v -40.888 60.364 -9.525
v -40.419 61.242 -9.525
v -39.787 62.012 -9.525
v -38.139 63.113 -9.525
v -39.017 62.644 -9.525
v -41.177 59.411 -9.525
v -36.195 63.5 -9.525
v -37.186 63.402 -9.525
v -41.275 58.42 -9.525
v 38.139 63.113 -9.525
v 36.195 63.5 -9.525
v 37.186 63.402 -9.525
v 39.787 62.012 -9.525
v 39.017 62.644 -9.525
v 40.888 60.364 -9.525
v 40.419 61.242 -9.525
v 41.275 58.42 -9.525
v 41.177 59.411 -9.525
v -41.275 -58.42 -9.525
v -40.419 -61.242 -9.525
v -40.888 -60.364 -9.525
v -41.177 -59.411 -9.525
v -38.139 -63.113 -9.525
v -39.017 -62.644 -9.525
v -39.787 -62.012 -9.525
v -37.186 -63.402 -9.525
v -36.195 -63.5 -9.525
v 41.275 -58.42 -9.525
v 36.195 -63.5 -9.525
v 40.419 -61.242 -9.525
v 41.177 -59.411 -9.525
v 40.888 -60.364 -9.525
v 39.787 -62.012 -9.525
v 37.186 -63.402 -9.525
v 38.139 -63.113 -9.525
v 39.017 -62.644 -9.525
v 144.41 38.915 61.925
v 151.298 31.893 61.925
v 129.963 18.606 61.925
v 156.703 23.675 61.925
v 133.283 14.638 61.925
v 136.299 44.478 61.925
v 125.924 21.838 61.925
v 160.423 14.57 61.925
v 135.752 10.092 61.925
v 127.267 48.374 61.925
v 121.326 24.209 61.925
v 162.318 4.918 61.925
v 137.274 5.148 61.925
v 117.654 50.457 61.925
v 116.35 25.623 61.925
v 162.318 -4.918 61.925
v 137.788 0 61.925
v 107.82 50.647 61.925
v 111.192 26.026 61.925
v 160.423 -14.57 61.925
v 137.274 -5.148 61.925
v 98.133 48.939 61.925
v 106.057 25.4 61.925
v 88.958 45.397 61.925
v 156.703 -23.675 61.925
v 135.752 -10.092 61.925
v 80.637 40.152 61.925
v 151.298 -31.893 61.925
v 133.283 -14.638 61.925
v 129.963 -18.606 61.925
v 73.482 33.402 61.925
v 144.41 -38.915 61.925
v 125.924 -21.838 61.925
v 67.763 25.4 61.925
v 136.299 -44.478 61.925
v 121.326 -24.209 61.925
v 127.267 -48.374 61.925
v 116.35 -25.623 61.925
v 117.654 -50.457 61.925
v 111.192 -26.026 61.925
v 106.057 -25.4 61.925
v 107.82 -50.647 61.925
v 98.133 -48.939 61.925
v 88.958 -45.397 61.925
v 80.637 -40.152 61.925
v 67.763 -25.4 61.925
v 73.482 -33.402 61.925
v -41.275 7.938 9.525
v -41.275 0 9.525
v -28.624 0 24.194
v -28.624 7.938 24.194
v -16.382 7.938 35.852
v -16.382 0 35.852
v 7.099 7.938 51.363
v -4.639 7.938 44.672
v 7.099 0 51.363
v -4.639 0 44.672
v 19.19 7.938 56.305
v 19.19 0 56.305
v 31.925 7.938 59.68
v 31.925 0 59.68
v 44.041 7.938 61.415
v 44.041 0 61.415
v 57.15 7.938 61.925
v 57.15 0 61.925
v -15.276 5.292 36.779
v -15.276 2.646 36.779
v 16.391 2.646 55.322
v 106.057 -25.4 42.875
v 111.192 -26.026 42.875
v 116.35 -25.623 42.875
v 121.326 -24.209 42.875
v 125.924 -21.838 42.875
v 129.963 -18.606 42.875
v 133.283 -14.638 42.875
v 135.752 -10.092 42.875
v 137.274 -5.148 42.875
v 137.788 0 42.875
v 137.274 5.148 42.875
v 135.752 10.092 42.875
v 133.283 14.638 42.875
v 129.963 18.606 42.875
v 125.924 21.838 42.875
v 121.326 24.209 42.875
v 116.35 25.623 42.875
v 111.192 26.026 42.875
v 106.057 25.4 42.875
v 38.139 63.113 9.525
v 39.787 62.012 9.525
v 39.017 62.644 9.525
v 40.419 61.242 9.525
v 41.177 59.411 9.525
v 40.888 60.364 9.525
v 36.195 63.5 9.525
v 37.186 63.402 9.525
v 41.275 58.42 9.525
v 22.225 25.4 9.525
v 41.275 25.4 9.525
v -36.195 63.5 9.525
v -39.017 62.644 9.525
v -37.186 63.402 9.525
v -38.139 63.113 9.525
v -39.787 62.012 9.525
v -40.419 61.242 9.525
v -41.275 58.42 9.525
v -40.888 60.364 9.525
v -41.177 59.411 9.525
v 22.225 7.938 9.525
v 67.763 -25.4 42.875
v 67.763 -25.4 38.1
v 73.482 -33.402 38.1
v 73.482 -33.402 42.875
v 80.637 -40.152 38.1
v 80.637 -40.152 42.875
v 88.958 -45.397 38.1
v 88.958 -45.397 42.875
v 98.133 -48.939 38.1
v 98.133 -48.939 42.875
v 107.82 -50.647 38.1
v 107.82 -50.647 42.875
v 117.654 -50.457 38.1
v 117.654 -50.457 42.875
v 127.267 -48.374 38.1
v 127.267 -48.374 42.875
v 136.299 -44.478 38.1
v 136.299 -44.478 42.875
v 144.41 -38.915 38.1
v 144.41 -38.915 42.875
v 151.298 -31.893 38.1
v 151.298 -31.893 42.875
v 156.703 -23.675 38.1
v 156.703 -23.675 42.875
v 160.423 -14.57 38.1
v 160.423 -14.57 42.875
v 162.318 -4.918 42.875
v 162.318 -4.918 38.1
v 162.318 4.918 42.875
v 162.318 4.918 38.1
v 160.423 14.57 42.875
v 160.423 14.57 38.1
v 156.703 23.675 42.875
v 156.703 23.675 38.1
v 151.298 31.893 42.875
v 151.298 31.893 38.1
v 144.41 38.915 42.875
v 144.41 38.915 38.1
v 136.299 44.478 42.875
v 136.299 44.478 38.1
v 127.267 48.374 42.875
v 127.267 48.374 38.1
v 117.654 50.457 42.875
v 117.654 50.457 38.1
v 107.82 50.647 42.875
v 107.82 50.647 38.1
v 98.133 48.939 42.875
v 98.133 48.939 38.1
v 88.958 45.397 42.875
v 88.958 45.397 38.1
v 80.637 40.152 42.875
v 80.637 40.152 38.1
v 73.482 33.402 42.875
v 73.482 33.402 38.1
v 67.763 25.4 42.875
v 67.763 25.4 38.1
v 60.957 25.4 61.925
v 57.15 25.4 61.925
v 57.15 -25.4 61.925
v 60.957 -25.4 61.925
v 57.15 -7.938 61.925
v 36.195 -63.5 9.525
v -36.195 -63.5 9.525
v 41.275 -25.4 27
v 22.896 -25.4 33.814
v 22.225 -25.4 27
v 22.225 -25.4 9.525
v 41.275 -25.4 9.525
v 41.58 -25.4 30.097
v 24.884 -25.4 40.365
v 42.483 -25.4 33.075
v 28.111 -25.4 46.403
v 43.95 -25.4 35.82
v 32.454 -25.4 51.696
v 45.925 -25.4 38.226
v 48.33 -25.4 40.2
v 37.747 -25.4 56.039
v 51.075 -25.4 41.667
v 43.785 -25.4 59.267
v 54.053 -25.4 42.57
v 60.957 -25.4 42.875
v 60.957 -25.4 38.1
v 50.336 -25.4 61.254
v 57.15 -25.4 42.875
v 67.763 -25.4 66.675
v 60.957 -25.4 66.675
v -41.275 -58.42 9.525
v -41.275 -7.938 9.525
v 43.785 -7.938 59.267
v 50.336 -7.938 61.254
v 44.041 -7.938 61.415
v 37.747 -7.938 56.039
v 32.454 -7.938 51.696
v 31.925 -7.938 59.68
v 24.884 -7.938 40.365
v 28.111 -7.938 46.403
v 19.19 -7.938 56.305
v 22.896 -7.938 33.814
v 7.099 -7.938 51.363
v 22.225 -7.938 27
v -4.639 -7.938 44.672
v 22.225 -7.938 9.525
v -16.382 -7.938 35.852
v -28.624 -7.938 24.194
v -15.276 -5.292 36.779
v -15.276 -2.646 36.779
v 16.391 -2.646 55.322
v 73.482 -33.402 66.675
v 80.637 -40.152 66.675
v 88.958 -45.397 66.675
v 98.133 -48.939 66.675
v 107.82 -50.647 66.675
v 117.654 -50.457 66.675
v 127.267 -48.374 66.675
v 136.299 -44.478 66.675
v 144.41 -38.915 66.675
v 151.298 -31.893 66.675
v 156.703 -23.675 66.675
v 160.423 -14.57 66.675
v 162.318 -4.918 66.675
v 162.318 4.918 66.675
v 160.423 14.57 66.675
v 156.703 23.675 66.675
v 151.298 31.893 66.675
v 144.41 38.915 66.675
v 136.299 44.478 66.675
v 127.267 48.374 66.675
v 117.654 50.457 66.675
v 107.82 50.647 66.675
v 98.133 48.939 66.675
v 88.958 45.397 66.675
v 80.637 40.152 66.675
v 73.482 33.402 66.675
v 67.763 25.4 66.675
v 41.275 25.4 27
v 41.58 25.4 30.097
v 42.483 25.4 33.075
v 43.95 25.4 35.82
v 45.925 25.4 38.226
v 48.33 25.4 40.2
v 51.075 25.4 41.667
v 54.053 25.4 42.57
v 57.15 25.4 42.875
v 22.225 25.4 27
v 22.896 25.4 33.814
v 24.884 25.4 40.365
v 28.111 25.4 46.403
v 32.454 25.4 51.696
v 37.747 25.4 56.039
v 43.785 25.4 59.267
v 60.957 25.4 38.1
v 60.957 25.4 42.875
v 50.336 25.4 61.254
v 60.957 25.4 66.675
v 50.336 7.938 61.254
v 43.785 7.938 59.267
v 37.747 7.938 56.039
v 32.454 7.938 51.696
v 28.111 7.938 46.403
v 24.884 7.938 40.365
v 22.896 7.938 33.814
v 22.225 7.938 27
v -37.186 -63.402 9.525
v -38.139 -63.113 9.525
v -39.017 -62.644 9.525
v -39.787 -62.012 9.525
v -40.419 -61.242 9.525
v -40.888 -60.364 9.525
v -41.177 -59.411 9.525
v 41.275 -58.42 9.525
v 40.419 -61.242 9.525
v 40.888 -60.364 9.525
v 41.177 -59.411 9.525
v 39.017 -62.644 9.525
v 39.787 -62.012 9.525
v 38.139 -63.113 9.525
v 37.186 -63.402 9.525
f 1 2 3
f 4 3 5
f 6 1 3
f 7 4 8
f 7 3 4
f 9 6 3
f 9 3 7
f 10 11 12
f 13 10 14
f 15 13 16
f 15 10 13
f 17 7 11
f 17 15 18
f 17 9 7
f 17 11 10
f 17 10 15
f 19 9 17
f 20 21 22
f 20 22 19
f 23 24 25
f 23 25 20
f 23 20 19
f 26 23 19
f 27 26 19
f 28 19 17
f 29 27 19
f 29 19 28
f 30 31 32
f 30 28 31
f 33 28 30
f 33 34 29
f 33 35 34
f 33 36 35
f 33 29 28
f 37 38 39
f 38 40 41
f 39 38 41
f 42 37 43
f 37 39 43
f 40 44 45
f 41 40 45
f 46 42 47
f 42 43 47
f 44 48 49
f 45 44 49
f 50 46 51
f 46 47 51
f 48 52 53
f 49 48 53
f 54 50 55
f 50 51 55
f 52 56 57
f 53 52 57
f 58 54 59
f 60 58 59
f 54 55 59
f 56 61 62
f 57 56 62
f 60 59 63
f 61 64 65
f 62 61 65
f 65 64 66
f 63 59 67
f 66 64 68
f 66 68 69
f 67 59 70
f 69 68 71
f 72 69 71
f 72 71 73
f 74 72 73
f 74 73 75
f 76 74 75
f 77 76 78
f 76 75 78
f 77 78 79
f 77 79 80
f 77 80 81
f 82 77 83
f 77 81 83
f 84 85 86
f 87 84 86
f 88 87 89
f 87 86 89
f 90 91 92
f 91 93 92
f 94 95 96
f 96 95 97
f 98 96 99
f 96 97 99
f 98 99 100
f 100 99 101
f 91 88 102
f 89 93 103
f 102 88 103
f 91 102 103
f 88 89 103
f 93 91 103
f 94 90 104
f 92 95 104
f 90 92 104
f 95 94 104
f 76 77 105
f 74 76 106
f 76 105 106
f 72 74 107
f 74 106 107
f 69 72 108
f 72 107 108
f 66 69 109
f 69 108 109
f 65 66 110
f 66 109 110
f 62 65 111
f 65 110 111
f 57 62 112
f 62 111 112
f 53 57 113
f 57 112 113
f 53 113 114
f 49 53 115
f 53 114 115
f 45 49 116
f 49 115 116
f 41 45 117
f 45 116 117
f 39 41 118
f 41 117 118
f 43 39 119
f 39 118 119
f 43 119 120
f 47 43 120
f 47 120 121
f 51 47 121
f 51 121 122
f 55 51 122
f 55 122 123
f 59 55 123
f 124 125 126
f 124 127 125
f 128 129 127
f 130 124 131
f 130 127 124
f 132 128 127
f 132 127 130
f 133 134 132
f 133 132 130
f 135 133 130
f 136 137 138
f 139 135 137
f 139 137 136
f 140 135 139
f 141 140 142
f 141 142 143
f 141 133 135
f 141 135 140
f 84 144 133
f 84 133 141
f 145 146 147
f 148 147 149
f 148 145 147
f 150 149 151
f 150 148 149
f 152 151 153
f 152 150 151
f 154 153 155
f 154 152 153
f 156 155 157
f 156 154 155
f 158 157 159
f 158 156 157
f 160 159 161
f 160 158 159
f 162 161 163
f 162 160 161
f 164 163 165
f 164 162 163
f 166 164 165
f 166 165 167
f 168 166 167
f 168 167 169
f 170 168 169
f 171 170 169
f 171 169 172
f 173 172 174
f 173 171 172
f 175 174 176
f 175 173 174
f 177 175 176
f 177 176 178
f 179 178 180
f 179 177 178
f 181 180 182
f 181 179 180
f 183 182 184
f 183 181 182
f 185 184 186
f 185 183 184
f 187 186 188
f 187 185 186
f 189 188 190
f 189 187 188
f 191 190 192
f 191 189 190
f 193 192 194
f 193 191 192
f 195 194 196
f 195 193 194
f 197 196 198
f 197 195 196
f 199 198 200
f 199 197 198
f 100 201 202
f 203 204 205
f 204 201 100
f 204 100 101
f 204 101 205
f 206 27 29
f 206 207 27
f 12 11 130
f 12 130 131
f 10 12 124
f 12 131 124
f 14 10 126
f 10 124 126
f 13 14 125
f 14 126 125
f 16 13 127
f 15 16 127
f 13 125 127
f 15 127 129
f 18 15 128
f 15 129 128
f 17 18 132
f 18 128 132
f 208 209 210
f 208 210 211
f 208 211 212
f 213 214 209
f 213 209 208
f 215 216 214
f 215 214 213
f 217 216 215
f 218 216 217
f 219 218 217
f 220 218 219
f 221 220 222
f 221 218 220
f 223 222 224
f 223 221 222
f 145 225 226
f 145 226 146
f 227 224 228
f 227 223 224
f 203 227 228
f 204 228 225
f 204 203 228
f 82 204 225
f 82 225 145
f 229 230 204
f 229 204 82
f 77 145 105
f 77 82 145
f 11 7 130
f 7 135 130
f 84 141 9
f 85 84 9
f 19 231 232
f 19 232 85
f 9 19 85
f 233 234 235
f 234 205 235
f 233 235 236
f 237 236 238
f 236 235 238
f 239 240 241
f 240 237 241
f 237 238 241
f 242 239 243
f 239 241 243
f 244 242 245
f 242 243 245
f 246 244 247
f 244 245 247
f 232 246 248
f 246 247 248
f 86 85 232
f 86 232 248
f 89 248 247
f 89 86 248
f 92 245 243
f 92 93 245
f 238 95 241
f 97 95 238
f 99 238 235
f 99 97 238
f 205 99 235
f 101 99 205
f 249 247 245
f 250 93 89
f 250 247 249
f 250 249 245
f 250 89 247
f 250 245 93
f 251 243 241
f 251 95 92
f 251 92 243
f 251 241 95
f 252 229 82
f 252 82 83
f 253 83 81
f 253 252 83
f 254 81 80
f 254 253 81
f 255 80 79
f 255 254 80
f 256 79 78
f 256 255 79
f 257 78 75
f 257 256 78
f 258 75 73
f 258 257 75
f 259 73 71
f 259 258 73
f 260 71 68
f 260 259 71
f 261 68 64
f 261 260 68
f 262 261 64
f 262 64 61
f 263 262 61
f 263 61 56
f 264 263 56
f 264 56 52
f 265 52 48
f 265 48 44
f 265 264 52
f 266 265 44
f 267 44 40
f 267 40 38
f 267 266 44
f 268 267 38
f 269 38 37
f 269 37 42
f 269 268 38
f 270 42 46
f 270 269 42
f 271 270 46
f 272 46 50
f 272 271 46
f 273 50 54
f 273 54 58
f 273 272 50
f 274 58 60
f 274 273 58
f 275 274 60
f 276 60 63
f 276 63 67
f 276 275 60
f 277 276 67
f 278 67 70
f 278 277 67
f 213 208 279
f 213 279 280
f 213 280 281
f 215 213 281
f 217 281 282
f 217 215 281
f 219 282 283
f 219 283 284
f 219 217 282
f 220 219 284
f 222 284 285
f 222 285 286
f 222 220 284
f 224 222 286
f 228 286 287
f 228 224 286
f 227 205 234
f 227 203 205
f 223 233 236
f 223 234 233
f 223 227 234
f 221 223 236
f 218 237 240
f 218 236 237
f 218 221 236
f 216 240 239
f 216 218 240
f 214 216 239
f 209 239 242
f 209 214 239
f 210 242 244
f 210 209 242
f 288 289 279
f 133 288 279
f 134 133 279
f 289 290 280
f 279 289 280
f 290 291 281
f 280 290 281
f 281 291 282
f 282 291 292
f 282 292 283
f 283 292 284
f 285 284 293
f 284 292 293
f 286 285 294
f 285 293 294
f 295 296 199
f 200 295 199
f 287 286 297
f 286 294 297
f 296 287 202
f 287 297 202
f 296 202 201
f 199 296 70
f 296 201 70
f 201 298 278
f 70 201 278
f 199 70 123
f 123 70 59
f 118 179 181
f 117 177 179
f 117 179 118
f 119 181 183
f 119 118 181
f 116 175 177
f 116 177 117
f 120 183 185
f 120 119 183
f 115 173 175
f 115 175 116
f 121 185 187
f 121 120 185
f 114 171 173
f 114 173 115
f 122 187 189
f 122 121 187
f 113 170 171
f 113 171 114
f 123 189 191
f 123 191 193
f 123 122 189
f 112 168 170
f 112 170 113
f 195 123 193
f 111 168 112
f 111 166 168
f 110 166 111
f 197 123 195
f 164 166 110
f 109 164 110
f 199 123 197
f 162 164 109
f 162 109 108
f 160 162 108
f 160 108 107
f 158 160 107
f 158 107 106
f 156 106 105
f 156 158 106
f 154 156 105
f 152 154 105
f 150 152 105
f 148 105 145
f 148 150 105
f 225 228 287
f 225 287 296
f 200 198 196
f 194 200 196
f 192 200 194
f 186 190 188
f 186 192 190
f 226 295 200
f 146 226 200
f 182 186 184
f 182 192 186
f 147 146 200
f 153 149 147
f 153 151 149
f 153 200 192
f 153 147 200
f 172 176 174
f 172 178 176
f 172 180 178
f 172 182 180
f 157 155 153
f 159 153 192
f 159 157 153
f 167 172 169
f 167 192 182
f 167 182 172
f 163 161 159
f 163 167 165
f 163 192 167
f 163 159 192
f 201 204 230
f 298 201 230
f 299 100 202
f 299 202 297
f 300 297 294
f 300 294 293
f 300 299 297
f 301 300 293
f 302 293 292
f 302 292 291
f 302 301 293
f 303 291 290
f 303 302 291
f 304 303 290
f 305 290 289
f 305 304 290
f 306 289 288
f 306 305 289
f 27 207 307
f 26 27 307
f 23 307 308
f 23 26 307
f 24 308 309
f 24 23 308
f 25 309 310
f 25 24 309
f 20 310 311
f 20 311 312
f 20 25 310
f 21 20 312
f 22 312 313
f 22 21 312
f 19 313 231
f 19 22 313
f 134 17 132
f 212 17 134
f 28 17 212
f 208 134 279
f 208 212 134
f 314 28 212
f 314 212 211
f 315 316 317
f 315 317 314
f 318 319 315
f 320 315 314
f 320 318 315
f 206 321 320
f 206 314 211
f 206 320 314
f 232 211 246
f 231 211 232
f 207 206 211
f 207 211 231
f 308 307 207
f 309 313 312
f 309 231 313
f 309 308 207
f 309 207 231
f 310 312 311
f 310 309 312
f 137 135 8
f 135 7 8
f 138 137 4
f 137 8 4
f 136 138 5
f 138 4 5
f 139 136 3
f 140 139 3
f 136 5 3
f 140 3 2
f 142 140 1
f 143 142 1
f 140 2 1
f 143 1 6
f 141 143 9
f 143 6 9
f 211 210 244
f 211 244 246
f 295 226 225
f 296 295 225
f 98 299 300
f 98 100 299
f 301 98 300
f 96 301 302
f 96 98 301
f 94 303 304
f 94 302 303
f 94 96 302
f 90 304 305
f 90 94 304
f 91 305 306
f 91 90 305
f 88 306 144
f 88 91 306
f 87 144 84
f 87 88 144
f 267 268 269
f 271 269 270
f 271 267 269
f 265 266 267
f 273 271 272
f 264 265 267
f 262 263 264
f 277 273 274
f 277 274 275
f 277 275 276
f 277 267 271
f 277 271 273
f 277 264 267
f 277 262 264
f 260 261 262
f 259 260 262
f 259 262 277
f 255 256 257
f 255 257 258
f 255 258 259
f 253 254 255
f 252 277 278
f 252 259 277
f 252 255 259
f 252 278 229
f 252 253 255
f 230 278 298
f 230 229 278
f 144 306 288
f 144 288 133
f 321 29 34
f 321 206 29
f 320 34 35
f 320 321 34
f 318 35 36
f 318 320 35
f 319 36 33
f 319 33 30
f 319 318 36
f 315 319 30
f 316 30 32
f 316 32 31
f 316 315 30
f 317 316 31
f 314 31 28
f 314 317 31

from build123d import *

# Parameters (mm, degrees)
F1_DEPTH = 63.5
F0_W     = 24.7683575517
F0_H     = 19.05
F0_H_2   = 4.7498
F0_H_3   = 4.7752
F2_DEPTH = 25.4
F3_DEPTH = 7.9375
F5_R     = 5.08


with BuildPart() as f1:
    # F0 (on Front) → F1 (new body, symmetric)
    with BuildSketch(Plane.XZ):
        Polygon((22.225, 9.525), (-41.275, 9.525), (-41.275, -9.525), (41.275, -9.525), (41.275, 9.525), align=None)
    extrude(amount=F1_DEPTH, both=True)

    # F0 (on Front) → F2 (join, symmetric)
    with BuildSketch(Plane.XZ):
        with BuildLine():
            Line((22.225, 27.0002), (22.225, 9.525))
            Line((22.225, 9.525), (41.275, 9.525))
            Line((41.275, 9.525), (41.275, 27.0002))
            ThreePointArc((41.275, 27.0002), (45.9246798487, 38.2255201513), (57.15, 42.8752))
            Line((57.15, 42.8752), (60.9566424483, 42.8752))
            Line((60.9566424483, 42.8752), (60.9566424483, 61.9252))
            Line((60.9566424483, 61.9252), (57.15, 61.9252))
            ThreePointArc((57.15, 61.9252), (32.4542956671, 51.6959043329), (22.225, 27.0002))
        make_face()
        with Locations((73.3408212242, 52.4002)):
            Rectangle(F0_W, F0_H)
        with Locations((73.3408212242, 64.3001)):
            Rectangle(F0_W, F0_H_2)
        with Locations((73.3408212242, 40.4876)):
            Rectangle(F0_W, F0_H_3)
        Polygon((85.725, 66.675), (85.725, 61.9252), (85.725, 42.8752), (85.725, 38.1), (111.7566424483, 38.1), (111.7566424483, 66.675), align=None)
    extrude(amount=F2_DEPTH, both=True)

    # F0 (on Front) → F3 (join, symmetric)
    with BuildSketch(Plane.XZ):
        with BuildLine():
            add(Edge.make_bspline(
                [(-41.275, 9.525), (-16.9699750841, 40.0587767363), (10.705399327, 62.3685158789), (57.15, 61.9252)],
                knots=[0, 0, 0, 0, 111.5045361635, 111.5045361635, 111.5045361635, 111.5045361635], degree=3))
            Line((-41.275, 9.525), (22.225, 9.525))
            Line((22.225, 9.525), (22.225, 27.0002))
            ThreePointArc((22.225, 27.0002), (32.4542956671, 51.6959043329), (57.15, 61.9252))
        make_face()
    extrude(amount=F3_DEPTH, both=True)

    # F0 (on Front) → F4 (revolve)
    with BuildSketch(Plane.XZ):
        with Locations((73.3408212242, 64.3001)):
            Rectangle(F0_W, F0_H_2)
        Polygon((85.725, 66.675), (85.725, 61.9252), (85.725, 42.8752), (85.725, 38.1), (111.7566424483, 38.1), (111.7566424483, 66.675), align=None)
        with Locations((73.3408212242, 40.4876)):
            Rectangle(F0_W, F0_H_3)
    revolve(axis=Axis((111.7566424483, 0, 52.3875), (0, 0, 1)))

    # F5
    f5_edges = [f1.edges().sort_by_distance(p)[0] for p in [
        (41.275, -63.5, 0),
        (-41.275, -63.5, 0),
        (-41.275, 63.5, 0),
        (41.275, 63.5, 0),
    ]]
    fillet(f5_edges, radius=F5_R)


solid = f1.part
